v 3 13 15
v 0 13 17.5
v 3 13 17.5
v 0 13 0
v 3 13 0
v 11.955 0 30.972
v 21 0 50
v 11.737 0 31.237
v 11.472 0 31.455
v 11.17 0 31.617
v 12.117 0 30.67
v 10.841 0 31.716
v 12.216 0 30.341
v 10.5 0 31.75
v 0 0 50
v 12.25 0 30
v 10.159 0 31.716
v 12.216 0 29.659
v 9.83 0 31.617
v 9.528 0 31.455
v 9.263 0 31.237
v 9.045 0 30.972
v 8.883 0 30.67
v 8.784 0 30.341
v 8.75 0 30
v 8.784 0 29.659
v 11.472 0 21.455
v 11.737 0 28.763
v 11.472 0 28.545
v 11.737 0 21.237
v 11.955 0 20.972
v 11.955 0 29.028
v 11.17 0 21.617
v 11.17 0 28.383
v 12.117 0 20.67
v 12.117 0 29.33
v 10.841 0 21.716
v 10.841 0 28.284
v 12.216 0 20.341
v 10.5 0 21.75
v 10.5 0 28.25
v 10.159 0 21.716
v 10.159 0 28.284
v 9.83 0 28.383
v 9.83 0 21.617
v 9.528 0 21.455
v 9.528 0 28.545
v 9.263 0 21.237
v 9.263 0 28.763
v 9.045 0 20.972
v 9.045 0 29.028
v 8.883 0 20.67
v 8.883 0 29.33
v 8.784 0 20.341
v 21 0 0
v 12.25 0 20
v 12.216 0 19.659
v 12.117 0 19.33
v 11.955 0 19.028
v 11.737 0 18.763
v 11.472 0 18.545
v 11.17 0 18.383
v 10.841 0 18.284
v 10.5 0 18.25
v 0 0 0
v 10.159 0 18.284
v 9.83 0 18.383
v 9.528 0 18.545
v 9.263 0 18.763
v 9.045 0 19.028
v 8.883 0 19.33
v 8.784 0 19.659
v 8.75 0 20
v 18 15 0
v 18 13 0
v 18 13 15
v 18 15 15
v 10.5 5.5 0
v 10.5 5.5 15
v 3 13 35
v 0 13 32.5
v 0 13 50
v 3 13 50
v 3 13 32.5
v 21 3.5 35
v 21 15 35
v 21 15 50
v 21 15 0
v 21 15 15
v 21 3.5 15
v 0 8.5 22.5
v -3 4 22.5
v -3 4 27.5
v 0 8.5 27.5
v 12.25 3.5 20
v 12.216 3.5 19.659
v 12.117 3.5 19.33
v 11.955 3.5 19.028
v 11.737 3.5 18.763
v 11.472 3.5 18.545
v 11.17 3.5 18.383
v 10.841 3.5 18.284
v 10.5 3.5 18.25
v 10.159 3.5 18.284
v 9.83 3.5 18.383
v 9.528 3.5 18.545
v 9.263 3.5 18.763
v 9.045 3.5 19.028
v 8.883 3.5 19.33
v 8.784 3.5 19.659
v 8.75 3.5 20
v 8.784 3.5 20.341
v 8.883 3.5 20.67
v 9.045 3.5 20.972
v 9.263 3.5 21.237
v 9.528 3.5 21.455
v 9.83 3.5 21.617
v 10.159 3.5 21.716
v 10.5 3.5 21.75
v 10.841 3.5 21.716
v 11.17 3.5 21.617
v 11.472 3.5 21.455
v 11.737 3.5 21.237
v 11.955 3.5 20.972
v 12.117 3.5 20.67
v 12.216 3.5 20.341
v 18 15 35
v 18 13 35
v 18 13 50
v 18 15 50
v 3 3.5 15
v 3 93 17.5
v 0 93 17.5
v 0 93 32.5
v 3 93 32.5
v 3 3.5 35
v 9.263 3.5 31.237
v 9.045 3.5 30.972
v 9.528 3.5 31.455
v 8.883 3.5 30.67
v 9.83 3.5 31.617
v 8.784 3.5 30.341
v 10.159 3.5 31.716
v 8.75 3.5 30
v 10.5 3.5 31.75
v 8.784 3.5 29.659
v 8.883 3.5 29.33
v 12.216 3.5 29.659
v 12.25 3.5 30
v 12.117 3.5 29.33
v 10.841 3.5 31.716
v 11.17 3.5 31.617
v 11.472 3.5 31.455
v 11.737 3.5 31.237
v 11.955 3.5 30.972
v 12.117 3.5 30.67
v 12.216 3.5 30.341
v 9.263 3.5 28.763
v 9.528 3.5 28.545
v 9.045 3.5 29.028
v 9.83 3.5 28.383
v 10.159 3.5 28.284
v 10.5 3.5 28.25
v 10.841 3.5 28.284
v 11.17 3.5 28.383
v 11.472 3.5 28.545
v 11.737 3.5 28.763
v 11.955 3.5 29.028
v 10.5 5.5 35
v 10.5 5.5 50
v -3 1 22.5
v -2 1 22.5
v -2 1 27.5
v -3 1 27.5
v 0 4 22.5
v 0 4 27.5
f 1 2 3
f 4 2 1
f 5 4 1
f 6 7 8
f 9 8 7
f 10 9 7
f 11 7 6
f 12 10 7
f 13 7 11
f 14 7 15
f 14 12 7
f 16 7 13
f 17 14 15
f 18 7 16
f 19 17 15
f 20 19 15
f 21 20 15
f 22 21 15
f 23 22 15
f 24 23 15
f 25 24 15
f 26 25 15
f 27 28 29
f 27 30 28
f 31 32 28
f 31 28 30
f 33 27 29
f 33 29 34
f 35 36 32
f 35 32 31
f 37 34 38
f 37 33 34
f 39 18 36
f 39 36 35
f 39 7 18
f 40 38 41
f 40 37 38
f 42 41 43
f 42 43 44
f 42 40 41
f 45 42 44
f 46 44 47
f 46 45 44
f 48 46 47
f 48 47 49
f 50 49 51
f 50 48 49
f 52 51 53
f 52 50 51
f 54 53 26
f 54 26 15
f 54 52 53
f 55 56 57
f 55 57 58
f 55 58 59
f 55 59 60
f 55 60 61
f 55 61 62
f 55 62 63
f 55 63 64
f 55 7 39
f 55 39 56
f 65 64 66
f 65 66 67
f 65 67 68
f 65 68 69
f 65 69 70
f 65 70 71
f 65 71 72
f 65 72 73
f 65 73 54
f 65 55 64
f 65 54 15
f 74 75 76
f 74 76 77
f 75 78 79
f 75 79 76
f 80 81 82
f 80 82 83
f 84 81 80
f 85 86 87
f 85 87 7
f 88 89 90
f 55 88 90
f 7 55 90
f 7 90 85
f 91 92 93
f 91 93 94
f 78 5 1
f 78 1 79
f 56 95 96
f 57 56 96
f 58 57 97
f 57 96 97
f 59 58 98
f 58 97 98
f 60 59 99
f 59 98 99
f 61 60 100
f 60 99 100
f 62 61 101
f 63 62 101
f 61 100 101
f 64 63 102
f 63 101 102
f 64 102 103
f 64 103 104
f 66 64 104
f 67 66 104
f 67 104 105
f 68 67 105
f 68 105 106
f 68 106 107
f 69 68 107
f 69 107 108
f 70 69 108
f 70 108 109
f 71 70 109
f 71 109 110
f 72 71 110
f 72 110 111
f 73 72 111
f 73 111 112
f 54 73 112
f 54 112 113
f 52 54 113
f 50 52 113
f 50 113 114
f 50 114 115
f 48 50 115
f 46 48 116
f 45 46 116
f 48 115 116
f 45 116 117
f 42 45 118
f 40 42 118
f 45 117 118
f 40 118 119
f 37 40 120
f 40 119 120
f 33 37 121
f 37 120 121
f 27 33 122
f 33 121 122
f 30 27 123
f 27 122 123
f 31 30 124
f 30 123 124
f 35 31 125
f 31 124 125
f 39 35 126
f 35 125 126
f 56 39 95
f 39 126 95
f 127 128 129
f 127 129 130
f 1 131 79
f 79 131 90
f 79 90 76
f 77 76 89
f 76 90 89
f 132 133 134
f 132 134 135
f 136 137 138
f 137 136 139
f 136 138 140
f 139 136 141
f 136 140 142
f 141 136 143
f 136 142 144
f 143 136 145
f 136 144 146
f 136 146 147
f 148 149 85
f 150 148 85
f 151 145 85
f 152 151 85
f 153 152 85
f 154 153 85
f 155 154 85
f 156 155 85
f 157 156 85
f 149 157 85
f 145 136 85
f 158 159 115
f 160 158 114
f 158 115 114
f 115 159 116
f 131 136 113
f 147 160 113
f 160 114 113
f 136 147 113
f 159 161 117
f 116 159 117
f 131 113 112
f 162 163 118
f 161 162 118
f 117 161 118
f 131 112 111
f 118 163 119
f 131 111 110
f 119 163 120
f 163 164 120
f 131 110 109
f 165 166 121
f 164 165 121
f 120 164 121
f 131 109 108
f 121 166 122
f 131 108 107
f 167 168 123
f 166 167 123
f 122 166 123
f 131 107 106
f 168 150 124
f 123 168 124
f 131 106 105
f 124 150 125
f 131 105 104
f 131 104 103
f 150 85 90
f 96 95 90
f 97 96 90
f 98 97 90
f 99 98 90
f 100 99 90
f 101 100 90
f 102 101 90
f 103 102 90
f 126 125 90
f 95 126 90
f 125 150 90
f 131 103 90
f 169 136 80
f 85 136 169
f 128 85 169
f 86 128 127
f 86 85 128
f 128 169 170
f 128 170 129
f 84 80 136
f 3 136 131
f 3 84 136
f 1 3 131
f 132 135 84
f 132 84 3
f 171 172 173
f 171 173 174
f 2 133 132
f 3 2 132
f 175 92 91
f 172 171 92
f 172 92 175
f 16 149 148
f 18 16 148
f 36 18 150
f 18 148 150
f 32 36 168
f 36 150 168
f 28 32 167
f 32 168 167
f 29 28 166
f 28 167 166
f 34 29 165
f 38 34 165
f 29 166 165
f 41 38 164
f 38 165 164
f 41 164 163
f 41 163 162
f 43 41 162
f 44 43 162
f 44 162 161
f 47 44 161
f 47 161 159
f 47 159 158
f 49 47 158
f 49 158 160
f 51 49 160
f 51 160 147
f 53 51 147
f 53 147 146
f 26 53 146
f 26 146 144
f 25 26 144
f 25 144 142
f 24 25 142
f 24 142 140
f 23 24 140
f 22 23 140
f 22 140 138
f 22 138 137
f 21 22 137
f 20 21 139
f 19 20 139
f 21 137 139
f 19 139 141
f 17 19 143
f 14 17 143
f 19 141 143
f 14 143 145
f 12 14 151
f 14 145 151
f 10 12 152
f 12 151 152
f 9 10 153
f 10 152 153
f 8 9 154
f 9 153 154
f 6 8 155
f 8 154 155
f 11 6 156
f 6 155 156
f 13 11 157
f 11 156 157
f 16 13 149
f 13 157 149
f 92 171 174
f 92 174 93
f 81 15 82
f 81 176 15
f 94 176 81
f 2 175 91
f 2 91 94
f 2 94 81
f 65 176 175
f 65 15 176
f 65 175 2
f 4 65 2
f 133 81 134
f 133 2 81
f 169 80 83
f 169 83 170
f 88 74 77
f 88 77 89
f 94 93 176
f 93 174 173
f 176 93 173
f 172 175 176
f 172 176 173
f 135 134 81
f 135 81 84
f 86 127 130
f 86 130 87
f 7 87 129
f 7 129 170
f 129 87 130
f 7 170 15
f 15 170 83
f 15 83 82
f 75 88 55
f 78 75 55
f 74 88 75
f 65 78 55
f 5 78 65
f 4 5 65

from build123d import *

# Parameters (mm, degrees)
RESSALTO_EXTRUS_O1_DEPTH   = 50
ESBO_O3_W                  = 6
ESBO_O3_H                  = 17.5
CORTE_EXTRUS_O2_DEPTH      = 80
ESBO_O4_W                  = 20
ESBO_O4_H                  = 11.5
CORTE_EXTRUS_O3_DEPTH      = 18
ESBO_O5_R                  = 1.75
ESBO_O5_W                  = 3
ESBO_O5_H                  = 22.5
CORTE_EXTRUS_O4_DEPTH      = 90.5
CORTE_EXTRUS_O4_DEPTH_BACK = 4.5


with BuildPart() as part:
    # Esboço1 → Ressalto-extrusão1 (new body)
    with BuildSketch(Plane.XY):
        Polygon((21, 0), (0, 0), (0, 4), (-2, 1), (-3, 1), (-3, 4), (0, 8.5), (0, 93), (3, 93), (3, 13), (10.5, 5.5), (18, 13), (18, 15), (21, 15), align=None)
    extrude(amount=RESSALTO_EXTRUS_O1_DEPTH)

    # Esboço3 → Corte-extrusão2 (cut)
    with BuildSketch(Plane(origin=(0, 93, 0), x_dir=(1, 0, 0), z_dir=(0, 1, 0))):
        with Locations((0, -8.75)):
            Rectangle(ESBO_O3_W, ESBO_O3_H)
        with Locations((0, -41.25)):
            Rectangle(ESBO_O3_W, ESBO_O3_H)
    extrude(amount=-CORTE_EXTRUS_O2_DEPTH, mode=Mode.SUBTRACT)

    # Esboço4 → Corte-extrusão3 (cut)
    with BuildSketch(Plane(origin=(21, 0, 0), x_dir=(0, 0, -1), z_dir=(1, 0, 0))):
        with Locations((-25, 9.25)):
            Rectangle(ESBO_O4_W, ESBO_O4_H)
    extrude(amount=-CORTE_EXTRUS_O3_DEPTH, mode=Mode.SUBTRACT)

    # Esboço5 → Corte-extrusão4 (cut, two sides)
    with BuildSketch(Plane(origin=(0, 3.5, 0), x_dir=(1, 0, 0), z_dir=(0, 1, 0))) as corte_extrus_o4_sk:
        with Locations((10.5, -20)):
            Circle(ESBO_O5_R)
        with Locations((10.5, -30)):
            Circle(ESBO_O5_R)
        with Locations((-1.5, -11.25)):
            Rectangle(ESBO_O5_W, ESBO_O5_H)
        with Locations((-1.5, -38.75)):
            Rectangle(ESBO_O5_W, ESBO_O5_H)
    extrude(amount=CORTE_EXTRUS_O4_DEPTH, mode=Mode.SUBTRACT)
    extrude(corte_extrus_o4_sk.sketch, amount=-CORTE_EXTRUS_O4_DEPTH_BACK, mode=Mode.SUBTRACT)


solid = part.part
